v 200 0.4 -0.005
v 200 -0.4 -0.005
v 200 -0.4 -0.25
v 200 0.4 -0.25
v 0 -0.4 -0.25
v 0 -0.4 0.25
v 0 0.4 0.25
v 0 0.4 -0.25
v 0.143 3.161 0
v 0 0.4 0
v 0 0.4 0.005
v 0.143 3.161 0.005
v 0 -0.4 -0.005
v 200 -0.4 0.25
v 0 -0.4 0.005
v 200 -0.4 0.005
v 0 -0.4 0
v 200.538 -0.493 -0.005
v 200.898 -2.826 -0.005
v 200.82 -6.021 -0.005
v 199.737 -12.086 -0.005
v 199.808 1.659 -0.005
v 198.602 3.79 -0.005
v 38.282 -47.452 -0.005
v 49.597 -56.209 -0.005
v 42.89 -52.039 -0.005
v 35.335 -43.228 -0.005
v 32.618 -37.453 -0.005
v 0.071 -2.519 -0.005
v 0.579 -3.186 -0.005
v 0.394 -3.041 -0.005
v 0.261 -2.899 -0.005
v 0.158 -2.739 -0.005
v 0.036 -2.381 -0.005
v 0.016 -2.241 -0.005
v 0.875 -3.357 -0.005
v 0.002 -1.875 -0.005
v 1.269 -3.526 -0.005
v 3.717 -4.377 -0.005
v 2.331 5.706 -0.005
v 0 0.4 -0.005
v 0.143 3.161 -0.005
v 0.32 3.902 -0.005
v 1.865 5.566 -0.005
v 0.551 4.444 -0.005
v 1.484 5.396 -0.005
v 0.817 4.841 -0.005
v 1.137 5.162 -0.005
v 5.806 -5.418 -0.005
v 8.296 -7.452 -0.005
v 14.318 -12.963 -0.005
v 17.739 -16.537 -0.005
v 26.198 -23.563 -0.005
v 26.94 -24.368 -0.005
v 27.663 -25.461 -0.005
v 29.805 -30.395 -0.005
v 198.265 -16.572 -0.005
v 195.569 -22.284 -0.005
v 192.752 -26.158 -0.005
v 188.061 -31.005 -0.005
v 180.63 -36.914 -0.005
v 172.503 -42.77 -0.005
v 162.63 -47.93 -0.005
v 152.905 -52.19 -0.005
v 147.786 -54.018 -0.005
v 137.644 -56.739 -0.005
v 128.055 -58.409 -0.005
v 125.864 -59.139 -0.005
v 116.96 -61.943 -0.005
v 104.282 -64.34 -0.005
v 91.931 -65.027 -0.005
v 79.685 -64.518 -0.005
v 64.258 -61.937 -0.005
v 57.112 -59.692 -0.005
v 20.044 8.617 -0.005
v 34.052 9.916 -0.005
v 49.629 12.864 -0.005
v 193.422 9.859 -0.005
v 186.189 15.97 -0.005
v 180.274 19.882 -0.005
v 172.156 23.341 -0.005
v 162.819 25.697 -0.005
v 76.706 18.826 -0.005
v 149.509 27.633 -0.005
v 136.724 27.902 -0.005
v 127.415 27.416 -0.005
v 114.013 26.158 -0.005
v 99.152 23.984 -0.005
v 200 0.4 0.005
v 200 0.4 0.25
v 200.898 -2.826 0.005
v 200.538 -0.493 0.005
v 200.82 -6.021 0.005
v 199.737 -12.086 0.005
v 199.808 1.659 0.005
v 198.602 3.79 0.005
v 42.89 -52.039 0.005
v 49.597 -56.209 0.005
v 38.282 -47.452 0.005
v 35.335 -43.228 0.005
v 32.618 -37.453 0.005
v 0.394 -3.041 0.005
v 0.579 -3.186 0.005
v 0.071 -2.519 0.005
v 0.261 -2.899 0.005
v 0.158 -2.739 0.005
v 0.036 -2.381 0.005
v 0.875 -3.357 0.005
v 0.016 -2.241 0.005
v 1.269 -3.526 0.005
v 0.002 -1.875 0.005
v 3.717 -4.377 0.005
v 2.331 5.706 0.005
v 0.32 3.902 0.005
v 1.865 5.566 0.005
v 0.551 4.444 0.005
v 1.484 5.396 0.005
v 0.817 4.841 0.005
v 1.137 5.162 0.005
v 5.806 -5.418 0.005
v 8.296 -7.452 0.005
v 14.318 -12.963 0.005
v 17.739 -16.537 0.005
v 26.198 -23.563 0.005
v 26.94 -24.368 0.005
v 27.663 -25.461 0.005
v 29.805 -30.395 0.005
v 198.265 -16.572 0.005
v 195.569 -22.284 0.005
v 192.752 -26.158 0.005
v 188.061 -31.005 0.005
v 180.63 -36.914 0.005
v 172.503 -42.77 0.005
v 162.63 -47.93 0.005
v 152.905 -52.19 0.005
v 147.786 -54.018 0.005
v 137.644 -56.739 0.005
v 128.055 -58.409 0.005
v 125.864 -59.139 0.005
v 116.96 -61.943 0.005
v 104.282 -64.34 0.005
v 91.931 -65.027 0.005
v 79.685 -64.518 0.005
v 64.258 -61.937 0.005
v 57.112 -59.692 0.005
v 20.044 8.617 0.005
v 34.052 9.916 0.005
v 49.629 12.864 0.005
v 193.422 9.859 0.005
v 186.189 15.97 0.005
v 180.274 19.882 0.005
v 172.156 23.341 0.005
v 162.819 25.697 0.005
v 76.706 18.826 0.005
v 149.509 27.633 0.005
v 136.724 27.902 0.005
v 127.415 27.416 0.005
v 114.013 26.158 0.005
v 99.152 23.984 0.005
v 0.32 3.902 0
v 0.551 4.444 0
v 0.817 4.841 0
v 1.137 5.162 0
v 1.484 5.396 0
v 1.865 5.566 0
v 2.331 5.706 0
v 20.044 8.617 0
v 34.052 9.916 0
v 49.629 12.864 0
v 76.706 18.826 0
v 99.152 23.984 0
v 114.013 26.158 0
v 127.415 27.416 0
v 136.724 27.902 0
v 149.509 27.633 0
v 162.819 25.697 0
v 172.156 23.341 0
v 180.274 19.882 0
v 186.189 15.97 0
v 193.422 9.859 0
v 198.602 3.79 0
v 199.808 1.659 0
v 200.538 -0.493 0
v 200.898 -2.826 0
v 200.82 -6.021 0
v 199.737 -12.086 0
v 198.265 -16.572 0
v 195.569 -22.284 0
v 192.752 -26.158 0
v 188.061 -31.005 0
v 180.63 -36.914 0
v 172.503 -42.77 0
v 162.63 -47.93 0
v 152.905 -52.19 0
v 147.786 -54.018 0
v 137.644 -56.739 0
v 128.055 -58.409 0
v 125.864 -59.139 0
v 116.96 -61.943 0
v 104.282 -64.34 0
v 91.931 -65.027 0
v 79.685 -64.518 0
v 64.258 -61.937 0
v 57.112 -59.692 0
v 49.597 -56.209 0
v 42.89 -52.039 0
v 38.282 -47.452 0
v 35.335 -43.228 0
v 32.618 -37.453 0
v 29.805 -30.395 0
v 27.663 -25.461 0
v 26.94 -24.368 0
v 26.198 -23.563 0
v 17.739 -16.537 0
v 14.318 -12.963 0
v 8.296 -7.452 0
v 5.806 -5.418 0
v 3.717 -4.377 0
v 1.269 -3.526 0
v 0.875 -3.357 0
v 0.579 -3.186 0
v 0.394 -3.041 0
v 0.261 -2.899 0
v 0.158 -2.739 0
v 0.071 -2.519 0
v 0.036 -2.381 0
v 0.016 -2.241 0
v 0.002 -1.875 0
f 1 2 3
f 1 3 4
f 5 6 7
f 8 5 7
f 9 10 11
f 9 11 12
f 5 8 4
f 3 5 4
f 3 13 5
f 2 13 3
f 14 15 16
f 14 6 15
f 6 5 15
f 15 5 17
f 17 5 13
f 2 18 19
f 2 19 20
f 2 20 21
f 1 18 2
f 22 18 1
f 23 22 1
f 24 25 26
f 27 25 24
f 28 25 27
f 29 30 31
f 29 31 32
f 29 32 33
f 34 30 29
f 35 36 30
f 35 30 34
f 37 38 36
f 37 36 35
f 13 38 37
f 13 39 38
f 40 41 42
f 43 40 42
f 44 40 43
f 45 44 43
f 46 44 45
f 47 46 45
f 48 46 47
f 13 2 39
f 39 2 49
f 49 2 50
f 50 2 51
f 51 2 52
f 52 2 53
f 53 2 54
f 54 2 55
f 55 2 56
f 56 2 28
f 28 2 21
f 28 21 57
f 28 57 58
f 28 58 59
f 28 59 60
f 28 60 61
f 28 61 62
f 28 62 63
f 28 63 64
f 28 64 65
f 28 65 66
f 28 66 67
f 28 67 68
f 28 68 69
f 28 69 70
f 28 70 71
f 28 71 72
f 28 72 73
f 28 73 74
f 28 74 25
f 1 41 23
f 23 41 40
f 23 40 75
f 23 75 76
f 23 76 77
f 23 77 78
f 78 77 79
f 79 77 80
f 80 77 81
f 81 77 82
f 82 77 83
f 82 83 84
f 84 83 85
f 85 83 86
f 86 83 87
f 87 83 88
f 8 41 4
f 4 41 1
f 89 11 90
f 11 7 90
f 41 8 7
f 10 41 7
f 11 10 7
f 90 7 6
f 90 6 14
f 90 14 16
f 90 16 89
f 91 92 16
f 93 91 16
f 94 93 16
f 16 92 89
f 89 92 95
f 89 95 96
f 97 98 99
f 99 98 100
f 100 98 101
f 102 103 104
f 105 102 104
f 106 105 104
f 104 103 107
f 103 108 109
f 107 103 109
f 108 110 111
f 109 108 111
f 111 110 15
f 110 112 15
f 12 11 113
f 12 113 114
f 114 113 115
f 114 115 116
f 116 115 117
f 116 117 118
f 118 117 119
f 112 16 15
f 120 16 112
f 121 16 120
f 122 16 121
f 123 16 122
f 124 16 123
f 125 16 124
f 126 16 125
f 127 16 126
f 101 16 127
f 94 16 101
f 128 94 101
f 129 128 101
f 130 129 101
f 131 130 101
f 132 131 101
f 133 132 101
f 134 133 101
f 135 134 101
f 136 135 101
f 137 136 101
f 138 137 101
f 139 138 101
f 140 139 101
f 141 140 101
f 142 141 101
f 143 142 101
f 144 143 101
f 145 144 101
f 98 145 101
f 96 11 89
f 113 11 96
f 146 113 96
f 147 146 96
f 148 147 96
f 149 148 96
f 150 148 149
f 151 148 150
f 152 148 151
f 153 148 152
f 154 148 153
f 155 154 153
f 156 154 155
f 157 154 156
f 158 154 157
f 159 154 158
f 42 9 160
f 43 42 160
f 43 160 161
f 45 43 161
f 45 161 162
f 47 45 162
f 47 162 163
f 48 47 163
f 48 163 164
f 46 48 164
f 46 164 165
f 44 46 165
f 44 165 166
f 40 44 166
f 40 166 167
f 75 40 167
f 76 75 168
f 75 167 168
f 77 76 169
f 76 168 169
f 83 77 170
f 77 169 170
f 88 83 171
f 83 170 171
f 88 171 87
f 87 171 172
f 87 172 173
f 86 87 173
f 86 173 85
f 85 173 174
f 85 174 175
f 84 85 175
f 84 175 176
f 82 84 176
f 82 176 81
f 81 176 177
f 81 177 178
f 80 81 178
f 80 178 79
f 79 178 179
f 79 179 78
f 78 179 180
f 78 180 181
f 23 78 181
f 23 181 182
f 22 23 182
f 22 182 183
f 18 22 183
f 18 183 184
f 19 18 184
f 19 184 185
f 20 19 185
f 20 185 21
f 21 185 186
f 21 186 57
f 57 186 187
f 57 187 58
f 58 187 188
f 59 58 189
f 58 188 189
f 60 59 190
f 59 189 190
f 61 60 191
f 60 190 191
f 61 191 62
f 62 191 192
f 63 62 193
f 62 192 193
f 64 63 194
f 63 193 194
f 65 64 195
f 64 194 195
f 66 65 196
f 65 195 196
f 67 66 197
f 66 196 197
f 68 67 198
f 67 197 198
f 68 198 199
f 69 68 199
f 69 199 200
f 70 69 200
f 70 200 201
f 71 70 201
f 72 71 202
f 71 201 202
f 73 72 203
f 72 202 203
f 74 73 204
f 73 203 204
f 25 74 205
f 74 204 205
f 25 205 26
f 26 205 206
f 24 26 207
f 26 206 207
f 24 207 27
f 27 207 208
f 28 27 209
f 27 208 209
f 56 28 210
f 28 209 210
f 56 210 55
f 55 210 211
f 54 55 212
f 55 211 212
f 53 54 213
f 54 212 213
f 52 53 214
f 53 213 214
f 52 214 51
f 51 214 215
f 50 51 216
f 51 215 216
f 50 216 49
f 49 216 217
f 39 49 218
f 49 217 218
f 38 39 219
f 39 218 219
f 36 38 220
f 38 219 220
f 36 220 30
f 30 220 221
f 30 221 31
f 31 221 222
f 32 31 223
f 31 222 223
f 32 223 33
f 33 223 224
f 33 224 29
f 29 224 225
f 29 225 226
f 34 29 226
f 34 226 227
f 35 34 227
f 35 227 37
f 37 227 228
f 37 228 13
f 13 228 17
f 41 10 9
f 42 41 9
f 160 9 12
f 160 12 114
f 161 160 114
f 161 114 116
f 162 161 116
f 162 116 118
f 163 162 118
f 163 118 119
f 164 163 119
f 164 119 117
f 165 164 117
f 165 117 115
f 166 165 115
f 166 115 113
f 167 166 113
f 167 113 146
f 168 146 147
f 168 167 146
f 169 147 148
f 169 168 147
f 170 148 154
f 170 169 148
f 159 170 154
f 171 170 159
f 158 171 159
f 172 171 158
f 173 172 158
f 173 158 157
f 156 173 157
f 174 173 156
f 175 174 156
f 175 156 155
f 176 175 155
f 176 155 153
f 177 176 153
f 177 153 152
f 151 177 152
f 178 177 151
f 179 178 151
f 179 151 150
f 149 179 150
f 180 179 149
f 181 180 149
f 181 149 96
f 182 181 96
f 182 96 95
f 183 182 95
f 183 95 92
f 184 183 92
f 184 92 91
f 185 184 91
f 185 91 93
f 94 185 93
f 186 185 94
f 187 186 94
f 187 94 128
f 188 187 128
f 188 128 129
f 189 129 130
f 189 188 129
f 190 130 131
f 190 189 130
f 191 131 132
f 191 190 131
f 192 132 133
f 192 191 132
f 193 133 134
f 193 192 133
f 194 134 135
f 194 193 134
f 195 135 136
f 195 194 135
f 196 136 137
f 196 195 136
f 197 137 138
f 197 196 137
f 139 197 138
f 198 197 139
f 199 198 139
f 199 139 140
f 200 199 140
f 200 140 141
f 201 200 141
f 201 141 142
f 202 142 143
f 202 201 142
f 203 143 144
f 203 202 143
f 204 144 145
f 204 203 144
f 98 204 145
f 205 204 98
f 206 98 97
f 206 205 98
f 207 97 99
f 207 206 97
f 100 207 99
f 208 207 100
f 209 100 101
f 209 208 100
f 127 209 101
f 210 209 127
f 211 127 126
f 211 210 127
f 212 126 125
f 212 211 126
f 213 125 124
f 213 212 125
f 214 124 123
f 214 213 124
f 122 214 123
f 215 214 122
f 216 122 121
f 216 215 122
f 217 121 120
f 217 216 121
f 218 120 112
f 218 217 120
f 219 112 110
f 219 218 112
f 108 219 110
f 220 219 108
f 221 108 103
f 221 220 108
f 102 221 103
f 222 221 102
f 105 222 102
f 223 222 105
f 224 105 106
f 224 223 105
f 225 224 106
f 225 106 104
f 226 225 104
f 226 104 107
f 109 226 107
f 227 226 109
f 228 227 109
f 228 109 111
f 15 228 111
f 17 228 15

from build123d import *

# Parameters (mm, degrees)
SKETCH_W     = 200
SKETCH_H     = 0.8
PAD_DEPTH    = 0.25
PAD001_DEPTH = 0.005


with BuildPart() as part:
    # Sketch → Pad (new body, symmetric)
    with BuildSketch(Plane.XY):
        with Locations((100, 0)):
            Rectangle(SKETCH_W, SKETCH_H)
    extrude(amount=PAD_DEPTH, both=True)

    # Sketch001 → Pad001 (join, symmetric)
    with BuildSketch(Plane.XY):
        with BuildLine():
            add(Edge.make_bspline(
                [(0.14271, 3.160527), (0.285419, 4.029207), (0.856258, 5.21208), (2.53308, 5.91401), (7.17359, 6.16748), (13.3154, 7.45434), (18.9698, 8.70221), (29.1753, 9.23325), (37.4424, 10.3056), (53.4608, 13.6842), (69.0288, 16.7869), (89.8063, 22.2126), (104.597, 25.0856), (114.132, 26.197), (123.14, 27.0939), (134.524, 27.9921), (145.092, 27.9337), (151.156, 27.5827), (158.012, 26.5087), (163.315, 25.6508), (168.385, 24.5589), (174.078, 22.7651), (178.64, 20.7958), (183.233, 18.3108), (187.309, 15.0936), (191.715, 11.5645), (195.205, 8.15235), (199.013, 3.48041), (200.125, 1.00417), (200.612, -0.65315), (200.963, -2.64194), (200.925, -5.73824), (200.457, -8.46795), (199.735, -12.465), (198.76, -15.2727), (197.18, -19.4806), (195.172, -23.0682), (193.124, -25.8759), (190.902, -28.0402), (188.655, -30.6274), (185.36, -33.2011), (182.669, -35.3264), (179.725, -37.6076), (176.758, -40.0541), (173.288, -42.3159), (169.7, -44.4607), (165.871, -46.4761), (161.679, -48.3674), (157.565, -50.1222), (152.612, -52.4035), (148.255, -53.8735), (143.439, -55.4334), (138.857, -56.4863), (135.094, -57.2857), (129.523, -58.3451), (128.197, -58.2866), (126.521, -58.8715), (124.278, -59.7685), (119.891, -61.2308), (114.373, -62.5956), (108.943, -63.674), (103.659, -64.4539), (100.013, -64.8244), (95.548, -64.9804), (91.7849, -65.0389), (86.6675, -65.0405), (81.5396, -64.7285), (77.211, -64.2606), (72.3366, -63.5196), (64.8345, -62.1674), (60.9155, -61.0365), (57.5813, -59.9251), (53.3503, -58.1508), (49.3727, -56.1231), (45.5039, -53.9494), (42.2672, -51.6876), (39.167, -48.5874), (36.3578, -45.1249), (34.096, -41.0889), (31.1127, -33.8238), (29.7868, -30.3142), (27.5219, -24.5885), (25.4356, -22.9312), (22.277, -20.143), (17.2989, -16.3686), (14.9981, -13.6389), (12.8729, -11.4551), (9.02644, -8.20825), (6.45272, -5.63452), (3.58652, -4.21118), (0.42786, -3.372765), (0.008958, -2.464734), (0, -2.006063), (0, 0), (0, 2.291847), (0.14271, 3.160527)],
                knots=[0, 0, 0, 0, 0.010753, 0.021505, 0.032258, 0.043011, 0.053763, 0.064516, 0.075269, 0.086022, 0.096774, 0.107527, 0.11828, 0.129032, 0.139785, 0.150538, 0.16129, 0.172043, 0.182796, 0.193548, 0.204301, 0.215054, 0.225806, 0.236559, 0.247312, 0.258065, 0.268817, 0.27957, 0.290323, 0.301075, 0.311828, 0.322581, 0.333333, 0.344086, 0.354839, 0.365591, 0.376344, 0.387097, 0.397849, 0.408602, 0.419355, 0.430108, 0.44086, 0.451613, 0.462366, 0.473118, 0.483871, 0.494624, 0.505376, 0.516129, 0.526882, 0.537634, 0.548387, 0.55914, 0.569892, 0.580645, 0.591398, 0.602151, 0.612903, 0.623656, 0.634409, 0.645161, 0.655914, 0.666667, 0.677419, 0.688172, 0.698925, 0.709677, 0.72043, 0.731183, 0.741935, 0.752688, 0.763441, 0.774194, 0.784946, 0.795699, 0.806452, 0.817204, 0.827957, 0.83871, 0.849462, 0.860215, 0.870968, 0.88172, 0.892473, 0.903226, 0.913978, 0.924731, 0.935484, 0.946237, 0.956989, 0.967742, 0.978495, 0.989247, 1, 1, 1, 1], degree=3))
        make_face()
    extrude(amount=PAD001_DEPTH, both=True)


solid = part.part
